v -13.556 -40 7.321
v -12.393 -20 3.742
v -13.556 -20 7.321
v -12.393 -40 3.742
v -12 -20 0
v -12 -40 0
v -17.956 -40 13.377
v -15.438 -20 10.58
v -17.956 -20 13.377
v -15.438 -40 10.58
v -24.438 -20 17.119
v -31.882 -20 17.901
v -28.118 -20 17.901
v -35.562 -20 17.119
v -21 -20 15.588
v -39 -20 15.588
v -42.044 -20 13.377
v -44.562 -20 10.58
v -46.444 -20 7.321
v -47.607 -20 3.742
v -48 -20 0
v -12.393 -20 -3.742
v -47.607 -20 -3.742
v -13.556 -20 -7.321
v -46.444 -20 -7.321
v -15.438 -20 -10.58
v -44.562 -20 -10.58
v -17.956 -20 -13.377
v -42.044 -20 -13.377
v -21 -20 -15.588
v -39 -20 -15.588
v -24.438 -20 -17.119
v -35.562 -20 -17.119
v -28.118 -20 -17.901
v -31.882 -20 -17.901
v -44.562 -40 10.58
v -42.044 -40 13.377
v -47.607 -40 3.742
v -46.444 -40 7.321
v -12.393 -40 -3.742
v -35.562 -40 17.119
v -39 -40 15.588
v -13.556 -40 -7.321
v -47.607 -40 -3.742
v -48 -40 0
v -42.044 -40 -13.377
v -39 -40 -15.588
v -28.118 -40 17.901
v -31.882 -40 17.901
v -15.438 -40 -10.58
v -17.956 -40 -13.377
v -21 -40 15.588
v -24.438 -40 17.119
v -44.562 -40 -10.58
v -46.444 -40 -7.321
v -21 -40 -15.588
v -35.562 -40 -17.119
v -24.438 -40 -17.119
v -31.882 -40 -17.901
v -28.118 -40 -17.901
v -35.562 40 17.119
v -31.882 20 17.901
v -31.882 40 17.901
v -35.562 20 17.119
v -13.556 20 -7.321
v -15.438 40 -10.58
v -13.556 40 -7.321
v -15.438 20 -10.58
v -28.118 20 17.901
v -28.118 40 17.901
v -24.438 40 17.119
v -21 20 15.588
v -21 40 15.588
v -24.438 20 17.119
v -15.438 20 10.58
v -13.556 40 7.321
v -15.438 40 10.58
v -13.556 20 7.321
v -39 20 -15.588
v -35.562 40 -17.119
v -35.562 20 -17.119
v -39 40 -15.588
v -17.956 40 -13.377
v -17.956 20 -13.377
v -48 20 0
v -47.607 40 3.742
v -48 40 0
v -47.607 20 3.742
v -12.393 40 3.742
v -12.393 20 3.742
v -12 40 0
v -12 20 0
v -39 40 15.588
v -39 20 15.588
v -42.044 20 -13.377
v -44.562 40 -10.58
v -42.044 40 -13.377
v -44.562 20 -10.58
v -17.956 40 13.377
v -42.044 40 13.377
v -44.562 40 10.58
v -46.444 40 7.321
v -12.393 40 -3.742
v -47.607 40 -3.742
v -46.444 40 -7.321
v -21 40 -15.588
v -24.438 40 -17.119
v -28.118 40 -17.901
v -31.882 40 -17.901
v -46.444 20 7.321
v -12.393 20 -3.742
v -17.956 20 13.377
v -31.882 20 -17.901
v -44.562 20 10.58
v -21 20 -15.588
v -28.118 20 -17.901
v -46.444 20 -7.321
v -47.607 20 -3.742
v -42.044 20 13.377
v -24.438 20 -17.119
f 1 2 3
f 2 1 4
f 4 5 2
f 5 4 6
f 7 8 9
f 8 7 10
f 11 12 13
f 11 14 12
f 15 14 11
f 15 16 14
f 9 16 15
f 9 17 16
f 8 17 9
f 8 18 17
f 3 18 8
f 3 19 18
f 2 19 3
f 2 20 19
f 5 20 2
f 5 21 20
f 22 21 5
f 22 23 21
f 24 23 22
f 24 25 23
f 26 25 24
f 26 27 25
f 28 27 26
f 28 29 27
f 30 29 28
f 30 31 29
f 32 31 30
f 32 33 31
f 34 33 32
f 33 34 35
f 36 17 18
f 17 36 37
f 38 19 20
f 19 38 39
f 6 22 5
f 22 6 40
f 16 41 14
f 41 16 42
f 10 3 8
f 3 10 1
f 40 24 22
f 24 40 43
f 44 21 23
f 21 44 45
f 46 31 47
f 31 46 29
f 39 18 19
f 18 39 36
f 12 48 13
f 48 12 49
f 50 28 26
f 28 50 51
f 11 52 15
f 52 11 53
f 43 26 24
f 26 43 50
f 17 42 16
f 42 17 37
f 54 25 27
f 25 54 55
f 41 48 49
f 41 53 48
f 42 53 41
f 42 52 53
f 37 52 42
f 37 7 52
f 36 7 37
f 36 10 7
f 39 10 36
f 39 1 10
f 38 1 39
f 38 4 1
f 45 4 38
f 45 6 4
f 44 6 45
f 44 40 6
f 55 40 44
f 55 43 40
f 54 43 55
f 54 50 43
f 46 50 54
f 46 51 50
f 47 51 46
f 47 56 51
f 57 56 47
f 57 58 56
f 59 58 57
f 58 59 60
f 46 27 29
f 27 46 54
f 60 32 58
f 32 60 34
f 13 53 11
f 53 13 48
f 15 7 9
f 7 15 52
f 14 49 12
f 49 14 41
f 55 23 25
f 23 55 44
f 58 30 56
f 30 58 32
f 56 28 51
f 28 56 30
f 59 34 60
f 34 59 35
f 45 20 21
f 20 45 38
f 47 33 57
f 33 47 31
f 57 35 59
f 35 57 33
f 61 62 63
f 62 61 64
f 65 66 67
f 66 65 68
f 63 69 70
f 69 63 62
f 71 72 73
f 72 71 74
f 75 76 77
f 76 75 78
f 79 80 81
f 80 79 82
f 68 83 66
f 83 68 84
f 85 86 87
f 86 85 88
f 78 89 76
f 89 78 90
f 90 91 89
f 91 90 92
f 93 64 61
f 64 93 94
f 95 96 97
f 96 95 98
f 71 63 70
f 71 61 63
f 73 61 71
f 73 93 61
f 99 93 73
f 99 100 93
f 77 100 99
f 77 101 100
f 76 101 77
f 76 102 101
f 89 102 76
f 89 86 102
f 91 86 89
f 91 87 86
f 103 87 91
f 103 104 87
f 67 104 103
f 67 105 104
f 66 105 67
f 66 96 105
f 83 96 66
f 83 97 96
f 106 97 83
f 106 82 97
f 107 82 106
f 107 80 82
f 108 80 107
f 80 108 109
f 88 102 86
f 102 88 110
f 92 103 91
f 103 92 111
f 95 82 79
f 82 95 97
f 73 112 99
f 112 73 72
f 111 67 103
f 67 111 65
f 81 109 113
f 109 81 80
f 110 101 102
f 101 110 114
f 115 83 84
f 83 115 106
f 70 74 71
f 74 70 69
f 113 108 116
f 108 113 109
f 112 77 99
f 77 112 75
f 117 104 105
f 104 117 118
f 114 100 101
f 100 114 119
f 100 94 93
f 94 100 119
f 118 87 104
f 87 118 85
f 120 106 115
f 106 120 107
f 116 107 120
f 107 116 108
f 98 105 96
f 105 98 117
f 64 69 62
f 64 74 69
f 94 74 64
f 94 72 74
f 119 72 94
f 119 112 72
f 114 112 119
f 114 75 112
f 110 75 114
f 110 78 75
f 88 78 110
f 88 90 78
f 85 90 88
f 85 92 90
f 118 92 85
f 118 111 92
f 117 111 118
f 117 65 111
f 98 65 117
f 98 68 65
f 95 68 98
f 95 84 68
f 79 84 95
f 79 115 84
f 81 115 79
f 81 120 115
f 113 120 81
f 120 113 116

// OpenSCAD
// Tank dimensions
tank_length = 100;
tank_width = 60;
tank_height = 30;





module wheel( track_width,track_height ){
         translate( [0, track_width/2, 0 ] )
         rotate( [ 90, 0, 0 ] ){
         cylinder( h = track_width, r = track_height / 2 );
    } 
}

module fulltrack( w, h, l ){
    track_width = w;
    track_height = h;
    track_length = l;

    translate( [-track_length/3,0, 0 ] )
    wheel(track_width,track_height * 1.8);
} 

module tracks(){
    track_width = 10;
    track_height = tank_height / 1.5;
    track_length = tank_length * 0.9;

    translate( [ 0, -tank_width / 2, 0 ] )
        fulltrack( 20, tank_height / 1.5, tank_length * 0.9);
    
    
    translate( [ 0, tank_width / 2, 0 ] )
        fulltrack( 20, tank_height / 1.5, tank_length * 0.9);
    
}


tracks();
